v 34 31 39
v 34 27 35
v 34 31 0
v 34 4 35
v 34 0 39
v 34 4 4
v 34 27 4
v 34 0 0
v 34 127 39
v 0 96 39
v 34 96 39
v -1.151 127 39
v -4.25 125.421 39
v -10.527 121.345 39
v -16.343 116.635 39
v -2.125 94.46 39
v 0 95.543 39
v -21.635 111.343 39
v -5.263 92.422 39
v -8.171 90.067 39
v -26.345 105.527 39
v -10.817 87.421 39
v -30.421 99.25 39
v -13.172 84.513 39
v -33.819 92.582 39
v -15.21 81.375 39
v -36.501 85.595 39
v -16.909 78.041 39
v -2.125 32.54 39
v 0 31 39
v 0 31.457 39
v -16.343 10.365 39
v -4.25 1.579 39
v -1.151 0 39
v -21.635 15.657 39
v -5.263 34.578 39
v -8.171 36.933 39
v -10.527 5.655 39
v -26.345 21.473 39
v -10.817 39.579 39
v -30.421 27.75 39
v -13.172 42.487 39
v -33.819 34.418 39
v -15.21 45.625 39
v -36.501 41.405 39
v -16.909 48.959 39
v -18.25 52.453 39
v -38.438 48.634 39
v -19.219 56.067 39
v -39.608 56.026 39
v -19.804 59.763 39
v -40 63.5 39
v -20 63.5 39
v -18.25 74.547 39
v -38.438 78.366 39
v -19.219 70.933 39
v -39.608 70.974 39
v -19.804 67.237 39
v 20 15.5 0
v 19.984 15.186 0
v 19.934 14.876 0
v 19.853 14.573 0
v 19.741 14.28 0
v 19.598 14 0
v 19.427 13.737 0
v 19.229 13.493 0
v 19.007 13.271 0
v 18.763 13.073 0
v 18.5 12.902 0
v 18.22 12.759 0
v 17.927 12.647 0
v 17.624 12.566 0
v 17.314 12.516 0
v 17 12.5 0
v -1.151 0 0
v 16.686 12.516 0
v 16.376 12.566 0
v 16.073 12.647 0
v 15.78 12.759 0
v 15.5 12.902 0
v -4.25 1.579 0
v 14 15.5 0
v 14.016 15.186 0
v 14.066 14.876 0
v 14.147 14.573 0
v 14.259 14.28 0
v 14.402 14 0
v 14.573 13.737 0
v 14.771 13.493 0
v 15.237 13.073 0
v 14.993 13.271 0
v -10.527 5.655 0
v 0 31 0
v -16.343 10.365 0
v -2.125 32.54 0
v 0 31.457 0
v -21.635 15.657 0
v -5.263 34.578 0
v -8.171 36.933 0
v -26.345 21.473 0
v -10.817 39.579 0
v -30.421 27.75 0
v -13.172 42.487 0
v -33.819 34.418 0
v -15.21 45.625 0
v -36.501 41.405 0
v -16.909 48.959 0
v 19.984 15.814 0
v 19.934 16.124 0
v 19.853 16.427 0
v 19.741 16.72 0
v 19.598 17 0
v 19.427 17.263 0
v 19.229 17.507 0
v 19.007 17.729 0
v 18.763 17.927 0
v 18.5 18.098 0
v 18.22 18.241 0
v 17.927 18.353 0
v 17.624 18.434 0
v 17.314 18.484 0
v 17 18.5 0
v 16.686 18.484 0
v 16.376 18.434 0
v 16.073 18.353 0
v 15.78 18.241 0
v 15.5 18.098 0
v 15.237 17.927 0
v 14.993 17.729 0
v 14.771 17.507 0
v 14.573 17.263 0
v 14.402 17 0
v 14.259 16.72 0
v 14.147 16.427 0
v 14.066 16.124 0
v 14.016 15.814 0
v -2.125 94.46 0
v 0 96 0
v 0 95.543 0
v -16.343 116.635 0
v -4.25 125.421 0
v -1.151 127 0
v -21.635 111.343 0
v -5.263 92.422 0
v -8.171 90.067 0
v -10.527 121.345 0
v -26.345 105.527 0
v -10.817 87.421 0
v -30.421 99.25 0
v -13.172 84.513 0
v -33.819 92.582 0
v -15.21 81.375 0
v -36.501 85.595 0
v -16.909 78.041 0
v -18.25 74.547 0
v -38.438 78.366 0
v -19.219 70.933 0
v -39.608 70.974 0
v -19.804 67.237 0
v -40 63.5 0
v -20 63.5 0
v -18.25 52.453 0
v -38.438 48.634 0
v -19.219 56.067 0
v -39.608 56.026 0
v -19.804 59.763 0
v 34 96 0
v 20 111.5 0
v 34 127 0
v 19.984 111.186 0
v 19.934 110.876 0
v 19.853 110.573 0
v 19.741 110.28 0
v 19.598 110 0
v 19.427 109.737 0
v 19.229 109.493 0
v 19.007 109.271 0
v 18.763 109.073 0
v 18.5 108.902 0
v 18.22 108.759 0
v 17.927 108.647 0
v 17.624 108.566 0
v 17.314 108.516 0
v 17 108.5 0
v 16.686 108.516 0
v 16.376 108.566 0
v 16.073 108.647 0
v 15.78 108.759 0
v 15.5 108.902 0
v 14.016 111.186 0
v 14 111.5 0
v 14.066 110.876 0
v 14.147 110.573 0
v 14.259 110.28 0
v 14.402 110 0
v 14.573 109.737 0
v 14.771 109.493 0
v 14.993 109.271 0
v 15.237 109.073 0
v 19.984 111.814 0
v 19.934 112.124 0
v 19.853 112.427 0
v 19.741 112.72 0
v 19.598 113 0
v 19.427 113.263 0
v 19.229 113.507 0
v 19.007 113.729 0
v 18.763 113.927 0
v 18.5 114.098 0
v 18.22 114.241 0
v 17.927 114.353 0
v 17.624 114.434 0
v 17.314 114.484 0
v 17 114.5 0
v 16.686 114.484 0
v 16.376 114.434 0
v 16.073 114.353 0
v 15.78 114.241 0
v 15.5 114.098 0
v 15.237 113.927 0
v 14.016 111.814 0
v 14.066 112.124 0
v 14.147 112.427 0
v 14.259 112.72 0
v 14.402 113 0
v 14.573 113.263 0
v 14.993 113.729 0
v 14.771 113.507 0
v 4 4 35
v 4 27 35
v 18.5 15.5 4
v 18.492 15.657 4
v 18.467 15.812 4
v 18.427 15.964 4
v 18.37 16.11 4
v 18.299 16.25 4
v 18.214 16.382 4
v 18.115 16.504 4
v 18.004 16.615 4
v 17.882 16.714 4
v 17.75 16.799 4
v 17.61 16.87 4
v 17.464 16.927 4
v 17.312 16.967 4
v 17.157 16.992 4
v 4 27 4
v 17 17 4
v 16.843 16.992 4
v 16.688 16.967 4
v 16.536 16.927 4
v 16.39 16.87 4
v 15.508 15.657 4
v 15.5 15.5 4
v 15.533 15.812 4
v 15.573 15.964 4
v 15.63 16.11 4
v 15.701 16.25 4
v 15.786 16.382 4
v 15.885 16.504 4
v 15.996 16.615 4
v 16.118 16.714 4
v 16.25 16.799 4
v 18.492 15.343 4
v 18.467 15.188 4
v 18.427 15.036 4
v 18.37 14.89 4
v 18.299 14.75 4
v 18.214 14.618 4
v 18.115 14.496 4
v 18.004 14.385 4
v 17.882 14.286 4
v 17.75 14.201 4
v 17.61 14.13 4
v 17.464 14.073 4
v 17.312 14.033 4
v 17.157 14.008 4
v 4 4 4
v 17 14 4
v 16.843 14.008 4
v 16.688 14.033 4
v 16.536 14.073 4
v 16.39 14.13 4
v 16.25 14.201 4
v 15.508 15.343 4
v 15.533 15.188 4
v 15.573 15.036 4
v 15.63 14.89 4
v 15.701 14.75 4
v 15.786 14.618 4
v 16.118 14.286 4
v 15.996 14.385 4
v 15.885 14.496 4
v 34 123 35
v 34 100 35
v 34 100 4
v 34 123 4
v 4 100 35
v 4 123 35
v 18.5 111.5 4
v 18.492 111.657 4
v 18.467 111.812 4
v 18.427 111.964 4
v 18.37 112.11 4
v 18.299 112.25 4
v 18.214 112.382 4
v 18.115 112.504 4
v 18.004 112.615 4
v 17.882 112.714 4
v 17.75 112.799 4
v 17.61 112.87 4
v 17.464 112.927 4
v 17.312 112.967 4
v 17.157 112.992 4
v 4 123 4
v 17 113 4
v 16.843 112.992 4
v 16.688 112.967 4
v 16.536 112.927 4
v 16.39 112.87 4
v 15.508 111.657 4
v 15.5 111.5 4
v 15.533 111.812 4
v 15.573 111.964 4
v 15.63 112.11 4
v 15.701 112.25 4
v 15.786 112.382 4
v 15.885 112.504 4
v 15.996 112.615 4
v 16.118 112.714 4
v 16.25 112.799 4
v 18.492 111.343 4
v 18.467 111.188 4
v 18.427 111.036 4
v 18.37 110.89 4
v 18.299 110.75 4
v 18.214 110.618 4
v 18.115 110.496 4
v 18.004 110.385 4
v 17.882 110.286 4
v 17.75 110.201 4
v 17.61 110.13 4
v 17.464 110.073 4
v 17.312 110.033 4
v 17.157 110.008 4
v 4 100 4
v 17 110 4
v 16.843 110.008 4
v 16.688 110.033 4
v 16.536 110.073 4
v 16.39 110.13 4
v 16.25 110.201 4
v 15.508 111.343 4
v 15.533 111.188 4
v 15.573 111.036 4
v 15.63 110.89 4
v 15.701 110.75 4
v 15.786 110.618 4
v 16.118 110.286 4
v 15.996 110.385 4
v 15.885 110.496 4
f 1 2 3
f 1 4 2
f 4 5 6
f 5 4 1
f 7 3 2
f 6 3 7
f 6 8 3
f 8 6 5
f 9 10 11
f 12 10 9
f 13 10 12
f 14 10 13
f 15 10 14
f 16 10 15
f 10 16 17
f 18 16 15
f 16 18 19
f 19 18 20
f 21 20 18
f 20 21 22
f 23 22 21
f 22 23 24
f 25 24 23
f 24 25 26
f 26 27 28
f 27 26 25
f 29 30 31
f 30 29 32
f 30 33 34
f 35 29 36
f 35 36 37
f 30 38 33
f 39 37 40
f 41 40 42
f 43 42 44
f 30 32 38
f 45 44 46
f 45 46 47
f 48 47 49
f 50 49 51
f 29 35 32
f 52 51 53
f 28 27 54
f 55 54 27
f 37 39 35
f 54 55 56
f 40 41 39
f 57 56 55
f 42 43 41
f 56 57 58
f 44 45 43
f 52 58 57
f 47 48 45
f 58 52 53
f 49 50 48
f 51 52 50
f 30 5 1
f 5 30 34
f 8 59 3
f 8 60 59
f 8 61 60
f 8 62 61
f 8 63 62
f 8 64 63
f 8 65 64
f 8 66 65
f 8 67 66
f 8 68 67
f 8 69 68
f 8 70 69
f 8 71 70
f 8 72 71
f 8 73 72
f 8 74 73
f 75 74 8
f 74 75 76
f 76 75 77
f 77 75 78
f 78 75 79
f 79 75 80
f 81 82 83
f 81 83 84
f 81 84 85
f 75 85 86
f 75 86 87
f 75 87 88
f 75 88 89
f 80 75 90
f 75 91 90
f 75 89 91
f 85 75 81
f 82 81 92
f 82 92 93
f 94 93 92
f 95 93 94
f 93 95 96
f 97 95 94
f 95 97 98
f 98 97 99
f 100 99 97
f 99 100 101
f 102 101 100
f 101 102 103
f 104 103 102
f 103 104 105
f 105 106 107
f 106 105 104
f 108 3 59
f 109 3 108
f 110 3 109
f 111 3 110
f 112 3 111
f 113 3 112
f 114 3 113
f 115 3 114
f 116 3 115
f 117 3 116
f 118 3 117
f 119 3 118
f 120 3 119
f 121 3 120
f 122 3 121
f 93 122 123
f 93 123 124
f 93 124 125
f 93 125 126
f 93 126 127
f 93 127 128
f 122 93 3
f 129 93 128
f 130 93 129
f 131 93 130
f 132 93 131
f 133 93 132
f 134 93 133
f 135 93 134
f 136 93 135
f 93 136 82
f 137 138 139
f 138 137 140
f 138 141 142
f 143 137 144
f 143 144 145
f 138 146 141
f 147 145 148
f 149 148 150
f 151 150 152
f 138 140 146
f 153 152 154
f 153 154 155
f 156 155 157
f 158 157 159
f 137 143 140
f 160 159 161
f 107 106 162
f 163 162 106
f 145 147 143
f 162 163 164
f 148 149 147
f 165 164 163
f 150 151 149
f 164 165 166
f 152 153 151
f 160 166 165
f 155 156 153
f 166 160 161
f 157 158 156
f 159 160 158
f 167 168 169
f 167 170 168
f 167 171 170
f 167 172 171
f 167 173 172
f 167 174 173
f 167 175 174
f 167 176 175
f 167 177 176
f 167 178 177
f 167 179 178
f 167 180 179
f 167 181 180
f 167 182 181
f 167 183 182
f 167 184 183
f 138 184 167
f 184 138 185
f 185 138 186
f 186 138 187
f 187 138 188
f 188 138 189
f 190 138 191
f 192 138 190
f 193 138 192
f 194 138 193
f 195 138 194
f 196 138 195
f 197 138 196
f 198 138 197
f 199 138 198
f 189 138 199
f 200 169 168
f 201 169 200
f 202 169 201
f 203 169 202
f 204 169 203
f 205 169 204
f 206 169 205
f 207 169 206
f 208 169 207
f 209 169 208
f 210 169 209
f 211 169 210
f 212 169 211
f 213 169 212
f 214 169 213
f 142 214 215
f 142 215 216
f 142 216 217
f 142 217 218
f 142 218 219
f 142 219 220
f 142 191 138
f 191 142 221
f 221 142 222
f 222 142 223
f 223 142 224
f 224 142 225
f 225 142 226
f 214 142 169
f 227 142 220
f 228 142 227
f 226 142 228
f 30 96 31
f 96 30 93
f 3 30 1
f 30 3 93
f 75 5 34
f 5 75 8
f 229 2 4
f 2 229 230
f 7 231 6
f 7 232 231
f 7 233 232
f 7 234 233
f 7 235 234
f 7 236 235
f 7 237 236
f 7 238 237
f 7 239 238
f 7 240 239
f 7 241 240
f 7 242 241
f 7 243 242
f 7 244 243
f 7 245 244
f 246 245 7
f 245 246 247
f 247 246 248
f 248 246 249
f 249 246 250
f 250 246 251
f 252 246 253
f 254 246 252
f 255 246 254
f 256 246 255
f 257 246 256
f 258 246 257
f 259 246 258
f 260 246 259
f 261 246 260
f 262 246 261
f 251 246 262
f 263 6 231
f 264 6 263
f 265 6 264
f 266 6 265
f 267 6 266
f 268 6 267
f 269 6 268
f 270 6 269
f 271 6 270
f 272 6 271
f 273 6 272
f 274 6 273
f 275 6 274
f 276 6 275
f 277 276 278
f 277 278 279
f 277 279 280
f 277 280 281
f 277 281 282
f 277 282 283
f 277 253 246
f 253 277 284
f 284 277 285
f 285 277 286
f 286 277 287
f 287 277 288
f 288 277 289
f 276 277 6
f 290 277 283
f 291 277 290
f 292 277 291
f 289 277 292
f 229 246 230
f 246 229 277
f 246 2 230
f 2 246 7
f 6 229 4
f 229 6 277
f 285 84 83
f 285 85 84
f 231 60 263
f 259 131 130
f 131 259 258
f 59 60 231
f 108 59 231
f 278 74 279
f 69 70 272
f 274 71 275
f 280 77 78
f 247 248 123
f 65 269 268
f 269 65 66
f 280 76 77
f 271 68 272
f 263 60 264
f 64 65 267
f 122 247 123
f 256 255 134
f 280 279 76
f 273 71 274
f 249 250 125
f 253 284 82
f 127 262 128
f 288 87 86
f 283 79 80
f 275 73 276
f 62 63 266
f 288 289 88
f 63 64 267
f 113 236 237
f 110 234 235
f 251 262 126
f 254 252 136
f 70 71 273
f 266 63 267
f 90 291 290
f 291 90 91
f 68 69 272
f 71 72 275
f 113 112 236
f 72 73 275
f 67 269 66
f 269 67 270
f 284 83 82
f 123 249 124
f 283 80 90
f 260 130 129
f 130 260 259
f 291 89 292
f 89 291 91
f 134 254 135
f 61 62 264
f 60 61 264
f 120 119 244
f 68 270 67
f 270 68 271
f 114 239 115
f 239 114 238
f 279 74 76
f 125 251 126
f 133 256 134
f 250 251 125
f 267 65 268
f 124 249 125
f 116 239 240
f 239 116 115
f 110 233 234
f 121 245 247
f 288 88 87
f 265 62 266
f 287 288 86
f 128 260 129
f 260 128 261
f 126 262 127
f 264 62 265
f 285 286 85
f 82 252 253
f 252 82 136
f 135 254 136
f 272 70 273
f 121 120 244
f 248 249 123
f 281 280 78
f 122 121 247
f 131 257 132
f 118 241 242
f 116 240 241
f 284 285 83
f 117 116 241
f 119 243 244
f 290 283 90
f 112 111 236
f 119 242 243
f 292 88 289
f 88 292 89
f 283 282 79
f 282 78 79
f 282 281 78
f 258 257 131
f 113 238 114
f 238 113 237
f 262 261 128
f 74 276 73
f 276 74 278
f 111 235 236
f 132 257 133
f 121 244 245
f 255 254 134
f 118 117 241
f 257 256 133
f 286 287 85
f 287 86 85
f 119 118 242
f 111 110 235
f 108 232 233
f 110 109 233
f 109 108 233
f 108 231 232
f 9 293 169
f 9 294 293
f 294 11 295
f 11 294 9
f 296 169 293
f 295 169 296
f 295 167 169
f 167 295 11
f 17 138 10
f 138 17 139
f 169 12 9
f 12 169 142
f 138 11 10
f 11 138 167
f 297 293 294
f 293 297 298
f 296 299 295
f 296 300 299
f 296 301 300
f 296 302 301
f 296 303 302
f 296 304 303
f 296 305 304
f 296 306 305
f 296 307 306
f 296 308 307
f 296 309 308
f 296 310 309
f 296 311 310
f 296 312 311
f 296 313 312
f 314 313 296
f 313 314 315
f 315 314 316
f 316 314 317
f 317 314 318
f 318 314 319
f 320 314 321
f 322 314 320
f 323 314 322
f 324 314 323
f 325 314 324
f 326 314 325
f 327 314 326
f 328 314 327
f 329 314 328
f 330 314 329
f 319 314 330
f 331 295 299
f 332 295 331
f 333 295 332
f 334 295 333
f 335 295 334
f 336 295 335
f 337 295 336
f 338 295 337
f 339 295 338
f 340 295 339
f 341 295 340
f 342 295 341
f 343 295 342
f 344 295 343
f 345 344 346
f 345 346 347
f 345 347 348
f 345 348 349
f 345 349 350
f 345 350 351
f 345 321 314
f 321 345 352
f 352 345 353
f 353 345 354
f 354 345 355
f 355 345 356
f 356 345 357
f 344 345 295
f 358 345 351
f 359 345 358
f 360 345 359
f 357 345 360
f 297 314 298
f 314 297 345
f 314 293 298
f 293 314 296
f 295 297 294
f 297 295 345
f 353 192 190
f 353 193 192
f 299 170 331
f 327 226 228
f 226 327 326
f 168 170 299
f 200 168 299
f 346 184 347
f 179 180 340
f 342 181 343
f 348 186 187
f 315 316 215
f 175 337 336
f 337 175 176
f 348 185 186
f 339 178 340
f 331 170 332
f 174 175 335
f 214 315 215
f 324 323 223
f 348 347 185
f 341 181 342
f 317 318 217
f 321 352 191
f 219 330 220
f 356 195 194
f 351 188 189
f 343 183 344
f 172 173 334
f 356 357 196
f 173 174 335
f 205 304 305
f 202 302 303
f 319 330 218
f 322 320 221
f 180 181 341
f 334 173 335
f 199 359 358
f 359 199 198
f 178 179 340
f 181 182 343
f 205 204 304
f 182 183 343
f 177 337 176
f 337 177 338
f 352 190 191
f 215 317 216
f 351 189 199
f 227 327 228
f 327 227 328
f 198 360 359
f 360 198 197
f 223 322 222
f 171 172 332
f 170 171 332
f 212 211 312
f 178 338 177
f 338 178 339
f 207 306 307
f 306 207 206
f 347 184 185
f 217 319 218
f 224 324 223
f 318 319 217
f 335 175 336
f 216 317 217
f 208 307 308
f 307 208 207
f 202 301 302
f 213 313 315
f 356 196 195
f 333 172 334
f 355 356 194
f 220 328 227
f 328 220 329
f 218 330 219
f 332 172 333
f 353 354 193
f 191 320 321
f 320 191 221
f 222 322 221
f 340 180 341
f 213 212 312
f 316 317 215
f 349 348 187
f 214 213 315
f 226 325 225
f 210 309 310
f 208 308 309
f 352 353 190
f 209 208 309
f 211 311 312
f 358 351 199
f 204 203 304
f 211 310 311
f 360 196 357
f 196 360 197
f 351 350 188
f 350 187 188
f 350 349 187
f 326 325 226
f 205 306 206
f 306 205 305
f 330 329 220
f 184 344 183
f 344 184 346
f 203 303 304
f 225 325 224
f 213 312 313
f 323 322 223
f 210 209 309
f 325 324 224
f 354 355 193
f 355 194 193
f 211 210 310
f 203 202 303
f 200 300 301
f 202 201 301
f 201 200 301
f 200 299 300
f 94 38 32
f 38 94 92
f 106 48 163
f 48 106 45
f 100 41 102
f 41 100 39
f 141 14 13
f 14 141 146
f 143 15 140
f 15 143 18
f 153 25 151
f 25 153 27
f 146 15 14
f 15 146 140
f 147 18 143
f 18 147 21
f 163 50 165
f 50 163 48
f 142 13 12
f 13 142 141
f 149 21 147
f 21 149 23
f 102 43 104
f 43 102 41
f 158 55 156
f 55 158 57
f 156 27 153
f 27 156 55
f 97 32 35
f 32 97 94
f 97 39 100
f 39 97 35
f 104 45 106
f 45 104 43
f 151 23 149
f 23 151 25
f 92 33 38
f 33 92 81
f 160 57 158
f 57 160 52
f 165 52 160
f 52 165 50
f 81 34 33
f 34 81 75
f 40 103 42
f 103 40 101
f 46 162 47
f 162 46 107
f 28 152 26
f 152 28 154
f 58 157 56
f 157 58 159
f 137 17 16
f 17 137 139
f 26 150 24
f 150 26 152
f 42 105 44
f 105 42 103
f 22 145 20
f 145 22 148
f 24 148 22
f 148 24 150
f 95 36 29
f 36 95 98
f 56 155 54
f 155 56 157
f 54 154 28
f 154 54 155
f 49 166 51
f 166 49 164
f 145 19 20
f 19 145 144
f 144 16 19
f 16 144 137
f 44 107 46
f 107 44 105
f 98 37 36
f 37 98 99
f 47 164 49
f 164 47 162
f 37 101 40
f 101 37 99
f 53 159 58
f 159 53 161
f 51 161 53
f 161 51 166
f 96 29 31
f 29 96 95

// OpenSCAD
blok = [30, 23, 31]; // diepte, breedte, hoogte  
dikte = 4;           // dikte van de wanden
afstand = 65;        // afstand tussen de twee blokken (lege ruimte
maxKromming = 20;     // middelste stuk naar achter
schoefGat = 6;

buitenBlok = blok + [dikte / 2, dikte, dikte] * 2;
verbinding = [maxKromming * 2, buitenBlok.y * 2 + afstand, buitenBlok.z];

blok();
translate([0, buitenBlok.y + afstand, 0])
blok();
verbinding();


module verbinding() {
    dIn  = afstand  * 1.1;
    dOut = afstand * 2.2;
    translate([-verbinding.x, 0, 0])
    difference() {
        cube(verbinding);
        translate([dIn / 2 + maxKromming, verbinding.y / 2, 0])
        #cylinder(d = dIn, h=verbinding.z, $fn = 60);
        #difference() {
            cube([verbinding.y, verbinding.y, verbinding.z]);
            translate([dOut / 2, verbinding.y / 2, 0])
                cylinder(d=dOut, h=verbinding.z, $fn=60);
        }
    }
}

module blok() {
    difference() {
        cube(buitenBlok);
        translate([dikte, dikte, dikte])
        cube(blok);
        schroefGat();
    }
}

module schroefGat() {
    translate([buitenBlok.x, buitenBlok.y] / 2)
    linear_extrude(height=dikte, scale= .5)
    circle(d=schoefGat, $fn=60);
}
